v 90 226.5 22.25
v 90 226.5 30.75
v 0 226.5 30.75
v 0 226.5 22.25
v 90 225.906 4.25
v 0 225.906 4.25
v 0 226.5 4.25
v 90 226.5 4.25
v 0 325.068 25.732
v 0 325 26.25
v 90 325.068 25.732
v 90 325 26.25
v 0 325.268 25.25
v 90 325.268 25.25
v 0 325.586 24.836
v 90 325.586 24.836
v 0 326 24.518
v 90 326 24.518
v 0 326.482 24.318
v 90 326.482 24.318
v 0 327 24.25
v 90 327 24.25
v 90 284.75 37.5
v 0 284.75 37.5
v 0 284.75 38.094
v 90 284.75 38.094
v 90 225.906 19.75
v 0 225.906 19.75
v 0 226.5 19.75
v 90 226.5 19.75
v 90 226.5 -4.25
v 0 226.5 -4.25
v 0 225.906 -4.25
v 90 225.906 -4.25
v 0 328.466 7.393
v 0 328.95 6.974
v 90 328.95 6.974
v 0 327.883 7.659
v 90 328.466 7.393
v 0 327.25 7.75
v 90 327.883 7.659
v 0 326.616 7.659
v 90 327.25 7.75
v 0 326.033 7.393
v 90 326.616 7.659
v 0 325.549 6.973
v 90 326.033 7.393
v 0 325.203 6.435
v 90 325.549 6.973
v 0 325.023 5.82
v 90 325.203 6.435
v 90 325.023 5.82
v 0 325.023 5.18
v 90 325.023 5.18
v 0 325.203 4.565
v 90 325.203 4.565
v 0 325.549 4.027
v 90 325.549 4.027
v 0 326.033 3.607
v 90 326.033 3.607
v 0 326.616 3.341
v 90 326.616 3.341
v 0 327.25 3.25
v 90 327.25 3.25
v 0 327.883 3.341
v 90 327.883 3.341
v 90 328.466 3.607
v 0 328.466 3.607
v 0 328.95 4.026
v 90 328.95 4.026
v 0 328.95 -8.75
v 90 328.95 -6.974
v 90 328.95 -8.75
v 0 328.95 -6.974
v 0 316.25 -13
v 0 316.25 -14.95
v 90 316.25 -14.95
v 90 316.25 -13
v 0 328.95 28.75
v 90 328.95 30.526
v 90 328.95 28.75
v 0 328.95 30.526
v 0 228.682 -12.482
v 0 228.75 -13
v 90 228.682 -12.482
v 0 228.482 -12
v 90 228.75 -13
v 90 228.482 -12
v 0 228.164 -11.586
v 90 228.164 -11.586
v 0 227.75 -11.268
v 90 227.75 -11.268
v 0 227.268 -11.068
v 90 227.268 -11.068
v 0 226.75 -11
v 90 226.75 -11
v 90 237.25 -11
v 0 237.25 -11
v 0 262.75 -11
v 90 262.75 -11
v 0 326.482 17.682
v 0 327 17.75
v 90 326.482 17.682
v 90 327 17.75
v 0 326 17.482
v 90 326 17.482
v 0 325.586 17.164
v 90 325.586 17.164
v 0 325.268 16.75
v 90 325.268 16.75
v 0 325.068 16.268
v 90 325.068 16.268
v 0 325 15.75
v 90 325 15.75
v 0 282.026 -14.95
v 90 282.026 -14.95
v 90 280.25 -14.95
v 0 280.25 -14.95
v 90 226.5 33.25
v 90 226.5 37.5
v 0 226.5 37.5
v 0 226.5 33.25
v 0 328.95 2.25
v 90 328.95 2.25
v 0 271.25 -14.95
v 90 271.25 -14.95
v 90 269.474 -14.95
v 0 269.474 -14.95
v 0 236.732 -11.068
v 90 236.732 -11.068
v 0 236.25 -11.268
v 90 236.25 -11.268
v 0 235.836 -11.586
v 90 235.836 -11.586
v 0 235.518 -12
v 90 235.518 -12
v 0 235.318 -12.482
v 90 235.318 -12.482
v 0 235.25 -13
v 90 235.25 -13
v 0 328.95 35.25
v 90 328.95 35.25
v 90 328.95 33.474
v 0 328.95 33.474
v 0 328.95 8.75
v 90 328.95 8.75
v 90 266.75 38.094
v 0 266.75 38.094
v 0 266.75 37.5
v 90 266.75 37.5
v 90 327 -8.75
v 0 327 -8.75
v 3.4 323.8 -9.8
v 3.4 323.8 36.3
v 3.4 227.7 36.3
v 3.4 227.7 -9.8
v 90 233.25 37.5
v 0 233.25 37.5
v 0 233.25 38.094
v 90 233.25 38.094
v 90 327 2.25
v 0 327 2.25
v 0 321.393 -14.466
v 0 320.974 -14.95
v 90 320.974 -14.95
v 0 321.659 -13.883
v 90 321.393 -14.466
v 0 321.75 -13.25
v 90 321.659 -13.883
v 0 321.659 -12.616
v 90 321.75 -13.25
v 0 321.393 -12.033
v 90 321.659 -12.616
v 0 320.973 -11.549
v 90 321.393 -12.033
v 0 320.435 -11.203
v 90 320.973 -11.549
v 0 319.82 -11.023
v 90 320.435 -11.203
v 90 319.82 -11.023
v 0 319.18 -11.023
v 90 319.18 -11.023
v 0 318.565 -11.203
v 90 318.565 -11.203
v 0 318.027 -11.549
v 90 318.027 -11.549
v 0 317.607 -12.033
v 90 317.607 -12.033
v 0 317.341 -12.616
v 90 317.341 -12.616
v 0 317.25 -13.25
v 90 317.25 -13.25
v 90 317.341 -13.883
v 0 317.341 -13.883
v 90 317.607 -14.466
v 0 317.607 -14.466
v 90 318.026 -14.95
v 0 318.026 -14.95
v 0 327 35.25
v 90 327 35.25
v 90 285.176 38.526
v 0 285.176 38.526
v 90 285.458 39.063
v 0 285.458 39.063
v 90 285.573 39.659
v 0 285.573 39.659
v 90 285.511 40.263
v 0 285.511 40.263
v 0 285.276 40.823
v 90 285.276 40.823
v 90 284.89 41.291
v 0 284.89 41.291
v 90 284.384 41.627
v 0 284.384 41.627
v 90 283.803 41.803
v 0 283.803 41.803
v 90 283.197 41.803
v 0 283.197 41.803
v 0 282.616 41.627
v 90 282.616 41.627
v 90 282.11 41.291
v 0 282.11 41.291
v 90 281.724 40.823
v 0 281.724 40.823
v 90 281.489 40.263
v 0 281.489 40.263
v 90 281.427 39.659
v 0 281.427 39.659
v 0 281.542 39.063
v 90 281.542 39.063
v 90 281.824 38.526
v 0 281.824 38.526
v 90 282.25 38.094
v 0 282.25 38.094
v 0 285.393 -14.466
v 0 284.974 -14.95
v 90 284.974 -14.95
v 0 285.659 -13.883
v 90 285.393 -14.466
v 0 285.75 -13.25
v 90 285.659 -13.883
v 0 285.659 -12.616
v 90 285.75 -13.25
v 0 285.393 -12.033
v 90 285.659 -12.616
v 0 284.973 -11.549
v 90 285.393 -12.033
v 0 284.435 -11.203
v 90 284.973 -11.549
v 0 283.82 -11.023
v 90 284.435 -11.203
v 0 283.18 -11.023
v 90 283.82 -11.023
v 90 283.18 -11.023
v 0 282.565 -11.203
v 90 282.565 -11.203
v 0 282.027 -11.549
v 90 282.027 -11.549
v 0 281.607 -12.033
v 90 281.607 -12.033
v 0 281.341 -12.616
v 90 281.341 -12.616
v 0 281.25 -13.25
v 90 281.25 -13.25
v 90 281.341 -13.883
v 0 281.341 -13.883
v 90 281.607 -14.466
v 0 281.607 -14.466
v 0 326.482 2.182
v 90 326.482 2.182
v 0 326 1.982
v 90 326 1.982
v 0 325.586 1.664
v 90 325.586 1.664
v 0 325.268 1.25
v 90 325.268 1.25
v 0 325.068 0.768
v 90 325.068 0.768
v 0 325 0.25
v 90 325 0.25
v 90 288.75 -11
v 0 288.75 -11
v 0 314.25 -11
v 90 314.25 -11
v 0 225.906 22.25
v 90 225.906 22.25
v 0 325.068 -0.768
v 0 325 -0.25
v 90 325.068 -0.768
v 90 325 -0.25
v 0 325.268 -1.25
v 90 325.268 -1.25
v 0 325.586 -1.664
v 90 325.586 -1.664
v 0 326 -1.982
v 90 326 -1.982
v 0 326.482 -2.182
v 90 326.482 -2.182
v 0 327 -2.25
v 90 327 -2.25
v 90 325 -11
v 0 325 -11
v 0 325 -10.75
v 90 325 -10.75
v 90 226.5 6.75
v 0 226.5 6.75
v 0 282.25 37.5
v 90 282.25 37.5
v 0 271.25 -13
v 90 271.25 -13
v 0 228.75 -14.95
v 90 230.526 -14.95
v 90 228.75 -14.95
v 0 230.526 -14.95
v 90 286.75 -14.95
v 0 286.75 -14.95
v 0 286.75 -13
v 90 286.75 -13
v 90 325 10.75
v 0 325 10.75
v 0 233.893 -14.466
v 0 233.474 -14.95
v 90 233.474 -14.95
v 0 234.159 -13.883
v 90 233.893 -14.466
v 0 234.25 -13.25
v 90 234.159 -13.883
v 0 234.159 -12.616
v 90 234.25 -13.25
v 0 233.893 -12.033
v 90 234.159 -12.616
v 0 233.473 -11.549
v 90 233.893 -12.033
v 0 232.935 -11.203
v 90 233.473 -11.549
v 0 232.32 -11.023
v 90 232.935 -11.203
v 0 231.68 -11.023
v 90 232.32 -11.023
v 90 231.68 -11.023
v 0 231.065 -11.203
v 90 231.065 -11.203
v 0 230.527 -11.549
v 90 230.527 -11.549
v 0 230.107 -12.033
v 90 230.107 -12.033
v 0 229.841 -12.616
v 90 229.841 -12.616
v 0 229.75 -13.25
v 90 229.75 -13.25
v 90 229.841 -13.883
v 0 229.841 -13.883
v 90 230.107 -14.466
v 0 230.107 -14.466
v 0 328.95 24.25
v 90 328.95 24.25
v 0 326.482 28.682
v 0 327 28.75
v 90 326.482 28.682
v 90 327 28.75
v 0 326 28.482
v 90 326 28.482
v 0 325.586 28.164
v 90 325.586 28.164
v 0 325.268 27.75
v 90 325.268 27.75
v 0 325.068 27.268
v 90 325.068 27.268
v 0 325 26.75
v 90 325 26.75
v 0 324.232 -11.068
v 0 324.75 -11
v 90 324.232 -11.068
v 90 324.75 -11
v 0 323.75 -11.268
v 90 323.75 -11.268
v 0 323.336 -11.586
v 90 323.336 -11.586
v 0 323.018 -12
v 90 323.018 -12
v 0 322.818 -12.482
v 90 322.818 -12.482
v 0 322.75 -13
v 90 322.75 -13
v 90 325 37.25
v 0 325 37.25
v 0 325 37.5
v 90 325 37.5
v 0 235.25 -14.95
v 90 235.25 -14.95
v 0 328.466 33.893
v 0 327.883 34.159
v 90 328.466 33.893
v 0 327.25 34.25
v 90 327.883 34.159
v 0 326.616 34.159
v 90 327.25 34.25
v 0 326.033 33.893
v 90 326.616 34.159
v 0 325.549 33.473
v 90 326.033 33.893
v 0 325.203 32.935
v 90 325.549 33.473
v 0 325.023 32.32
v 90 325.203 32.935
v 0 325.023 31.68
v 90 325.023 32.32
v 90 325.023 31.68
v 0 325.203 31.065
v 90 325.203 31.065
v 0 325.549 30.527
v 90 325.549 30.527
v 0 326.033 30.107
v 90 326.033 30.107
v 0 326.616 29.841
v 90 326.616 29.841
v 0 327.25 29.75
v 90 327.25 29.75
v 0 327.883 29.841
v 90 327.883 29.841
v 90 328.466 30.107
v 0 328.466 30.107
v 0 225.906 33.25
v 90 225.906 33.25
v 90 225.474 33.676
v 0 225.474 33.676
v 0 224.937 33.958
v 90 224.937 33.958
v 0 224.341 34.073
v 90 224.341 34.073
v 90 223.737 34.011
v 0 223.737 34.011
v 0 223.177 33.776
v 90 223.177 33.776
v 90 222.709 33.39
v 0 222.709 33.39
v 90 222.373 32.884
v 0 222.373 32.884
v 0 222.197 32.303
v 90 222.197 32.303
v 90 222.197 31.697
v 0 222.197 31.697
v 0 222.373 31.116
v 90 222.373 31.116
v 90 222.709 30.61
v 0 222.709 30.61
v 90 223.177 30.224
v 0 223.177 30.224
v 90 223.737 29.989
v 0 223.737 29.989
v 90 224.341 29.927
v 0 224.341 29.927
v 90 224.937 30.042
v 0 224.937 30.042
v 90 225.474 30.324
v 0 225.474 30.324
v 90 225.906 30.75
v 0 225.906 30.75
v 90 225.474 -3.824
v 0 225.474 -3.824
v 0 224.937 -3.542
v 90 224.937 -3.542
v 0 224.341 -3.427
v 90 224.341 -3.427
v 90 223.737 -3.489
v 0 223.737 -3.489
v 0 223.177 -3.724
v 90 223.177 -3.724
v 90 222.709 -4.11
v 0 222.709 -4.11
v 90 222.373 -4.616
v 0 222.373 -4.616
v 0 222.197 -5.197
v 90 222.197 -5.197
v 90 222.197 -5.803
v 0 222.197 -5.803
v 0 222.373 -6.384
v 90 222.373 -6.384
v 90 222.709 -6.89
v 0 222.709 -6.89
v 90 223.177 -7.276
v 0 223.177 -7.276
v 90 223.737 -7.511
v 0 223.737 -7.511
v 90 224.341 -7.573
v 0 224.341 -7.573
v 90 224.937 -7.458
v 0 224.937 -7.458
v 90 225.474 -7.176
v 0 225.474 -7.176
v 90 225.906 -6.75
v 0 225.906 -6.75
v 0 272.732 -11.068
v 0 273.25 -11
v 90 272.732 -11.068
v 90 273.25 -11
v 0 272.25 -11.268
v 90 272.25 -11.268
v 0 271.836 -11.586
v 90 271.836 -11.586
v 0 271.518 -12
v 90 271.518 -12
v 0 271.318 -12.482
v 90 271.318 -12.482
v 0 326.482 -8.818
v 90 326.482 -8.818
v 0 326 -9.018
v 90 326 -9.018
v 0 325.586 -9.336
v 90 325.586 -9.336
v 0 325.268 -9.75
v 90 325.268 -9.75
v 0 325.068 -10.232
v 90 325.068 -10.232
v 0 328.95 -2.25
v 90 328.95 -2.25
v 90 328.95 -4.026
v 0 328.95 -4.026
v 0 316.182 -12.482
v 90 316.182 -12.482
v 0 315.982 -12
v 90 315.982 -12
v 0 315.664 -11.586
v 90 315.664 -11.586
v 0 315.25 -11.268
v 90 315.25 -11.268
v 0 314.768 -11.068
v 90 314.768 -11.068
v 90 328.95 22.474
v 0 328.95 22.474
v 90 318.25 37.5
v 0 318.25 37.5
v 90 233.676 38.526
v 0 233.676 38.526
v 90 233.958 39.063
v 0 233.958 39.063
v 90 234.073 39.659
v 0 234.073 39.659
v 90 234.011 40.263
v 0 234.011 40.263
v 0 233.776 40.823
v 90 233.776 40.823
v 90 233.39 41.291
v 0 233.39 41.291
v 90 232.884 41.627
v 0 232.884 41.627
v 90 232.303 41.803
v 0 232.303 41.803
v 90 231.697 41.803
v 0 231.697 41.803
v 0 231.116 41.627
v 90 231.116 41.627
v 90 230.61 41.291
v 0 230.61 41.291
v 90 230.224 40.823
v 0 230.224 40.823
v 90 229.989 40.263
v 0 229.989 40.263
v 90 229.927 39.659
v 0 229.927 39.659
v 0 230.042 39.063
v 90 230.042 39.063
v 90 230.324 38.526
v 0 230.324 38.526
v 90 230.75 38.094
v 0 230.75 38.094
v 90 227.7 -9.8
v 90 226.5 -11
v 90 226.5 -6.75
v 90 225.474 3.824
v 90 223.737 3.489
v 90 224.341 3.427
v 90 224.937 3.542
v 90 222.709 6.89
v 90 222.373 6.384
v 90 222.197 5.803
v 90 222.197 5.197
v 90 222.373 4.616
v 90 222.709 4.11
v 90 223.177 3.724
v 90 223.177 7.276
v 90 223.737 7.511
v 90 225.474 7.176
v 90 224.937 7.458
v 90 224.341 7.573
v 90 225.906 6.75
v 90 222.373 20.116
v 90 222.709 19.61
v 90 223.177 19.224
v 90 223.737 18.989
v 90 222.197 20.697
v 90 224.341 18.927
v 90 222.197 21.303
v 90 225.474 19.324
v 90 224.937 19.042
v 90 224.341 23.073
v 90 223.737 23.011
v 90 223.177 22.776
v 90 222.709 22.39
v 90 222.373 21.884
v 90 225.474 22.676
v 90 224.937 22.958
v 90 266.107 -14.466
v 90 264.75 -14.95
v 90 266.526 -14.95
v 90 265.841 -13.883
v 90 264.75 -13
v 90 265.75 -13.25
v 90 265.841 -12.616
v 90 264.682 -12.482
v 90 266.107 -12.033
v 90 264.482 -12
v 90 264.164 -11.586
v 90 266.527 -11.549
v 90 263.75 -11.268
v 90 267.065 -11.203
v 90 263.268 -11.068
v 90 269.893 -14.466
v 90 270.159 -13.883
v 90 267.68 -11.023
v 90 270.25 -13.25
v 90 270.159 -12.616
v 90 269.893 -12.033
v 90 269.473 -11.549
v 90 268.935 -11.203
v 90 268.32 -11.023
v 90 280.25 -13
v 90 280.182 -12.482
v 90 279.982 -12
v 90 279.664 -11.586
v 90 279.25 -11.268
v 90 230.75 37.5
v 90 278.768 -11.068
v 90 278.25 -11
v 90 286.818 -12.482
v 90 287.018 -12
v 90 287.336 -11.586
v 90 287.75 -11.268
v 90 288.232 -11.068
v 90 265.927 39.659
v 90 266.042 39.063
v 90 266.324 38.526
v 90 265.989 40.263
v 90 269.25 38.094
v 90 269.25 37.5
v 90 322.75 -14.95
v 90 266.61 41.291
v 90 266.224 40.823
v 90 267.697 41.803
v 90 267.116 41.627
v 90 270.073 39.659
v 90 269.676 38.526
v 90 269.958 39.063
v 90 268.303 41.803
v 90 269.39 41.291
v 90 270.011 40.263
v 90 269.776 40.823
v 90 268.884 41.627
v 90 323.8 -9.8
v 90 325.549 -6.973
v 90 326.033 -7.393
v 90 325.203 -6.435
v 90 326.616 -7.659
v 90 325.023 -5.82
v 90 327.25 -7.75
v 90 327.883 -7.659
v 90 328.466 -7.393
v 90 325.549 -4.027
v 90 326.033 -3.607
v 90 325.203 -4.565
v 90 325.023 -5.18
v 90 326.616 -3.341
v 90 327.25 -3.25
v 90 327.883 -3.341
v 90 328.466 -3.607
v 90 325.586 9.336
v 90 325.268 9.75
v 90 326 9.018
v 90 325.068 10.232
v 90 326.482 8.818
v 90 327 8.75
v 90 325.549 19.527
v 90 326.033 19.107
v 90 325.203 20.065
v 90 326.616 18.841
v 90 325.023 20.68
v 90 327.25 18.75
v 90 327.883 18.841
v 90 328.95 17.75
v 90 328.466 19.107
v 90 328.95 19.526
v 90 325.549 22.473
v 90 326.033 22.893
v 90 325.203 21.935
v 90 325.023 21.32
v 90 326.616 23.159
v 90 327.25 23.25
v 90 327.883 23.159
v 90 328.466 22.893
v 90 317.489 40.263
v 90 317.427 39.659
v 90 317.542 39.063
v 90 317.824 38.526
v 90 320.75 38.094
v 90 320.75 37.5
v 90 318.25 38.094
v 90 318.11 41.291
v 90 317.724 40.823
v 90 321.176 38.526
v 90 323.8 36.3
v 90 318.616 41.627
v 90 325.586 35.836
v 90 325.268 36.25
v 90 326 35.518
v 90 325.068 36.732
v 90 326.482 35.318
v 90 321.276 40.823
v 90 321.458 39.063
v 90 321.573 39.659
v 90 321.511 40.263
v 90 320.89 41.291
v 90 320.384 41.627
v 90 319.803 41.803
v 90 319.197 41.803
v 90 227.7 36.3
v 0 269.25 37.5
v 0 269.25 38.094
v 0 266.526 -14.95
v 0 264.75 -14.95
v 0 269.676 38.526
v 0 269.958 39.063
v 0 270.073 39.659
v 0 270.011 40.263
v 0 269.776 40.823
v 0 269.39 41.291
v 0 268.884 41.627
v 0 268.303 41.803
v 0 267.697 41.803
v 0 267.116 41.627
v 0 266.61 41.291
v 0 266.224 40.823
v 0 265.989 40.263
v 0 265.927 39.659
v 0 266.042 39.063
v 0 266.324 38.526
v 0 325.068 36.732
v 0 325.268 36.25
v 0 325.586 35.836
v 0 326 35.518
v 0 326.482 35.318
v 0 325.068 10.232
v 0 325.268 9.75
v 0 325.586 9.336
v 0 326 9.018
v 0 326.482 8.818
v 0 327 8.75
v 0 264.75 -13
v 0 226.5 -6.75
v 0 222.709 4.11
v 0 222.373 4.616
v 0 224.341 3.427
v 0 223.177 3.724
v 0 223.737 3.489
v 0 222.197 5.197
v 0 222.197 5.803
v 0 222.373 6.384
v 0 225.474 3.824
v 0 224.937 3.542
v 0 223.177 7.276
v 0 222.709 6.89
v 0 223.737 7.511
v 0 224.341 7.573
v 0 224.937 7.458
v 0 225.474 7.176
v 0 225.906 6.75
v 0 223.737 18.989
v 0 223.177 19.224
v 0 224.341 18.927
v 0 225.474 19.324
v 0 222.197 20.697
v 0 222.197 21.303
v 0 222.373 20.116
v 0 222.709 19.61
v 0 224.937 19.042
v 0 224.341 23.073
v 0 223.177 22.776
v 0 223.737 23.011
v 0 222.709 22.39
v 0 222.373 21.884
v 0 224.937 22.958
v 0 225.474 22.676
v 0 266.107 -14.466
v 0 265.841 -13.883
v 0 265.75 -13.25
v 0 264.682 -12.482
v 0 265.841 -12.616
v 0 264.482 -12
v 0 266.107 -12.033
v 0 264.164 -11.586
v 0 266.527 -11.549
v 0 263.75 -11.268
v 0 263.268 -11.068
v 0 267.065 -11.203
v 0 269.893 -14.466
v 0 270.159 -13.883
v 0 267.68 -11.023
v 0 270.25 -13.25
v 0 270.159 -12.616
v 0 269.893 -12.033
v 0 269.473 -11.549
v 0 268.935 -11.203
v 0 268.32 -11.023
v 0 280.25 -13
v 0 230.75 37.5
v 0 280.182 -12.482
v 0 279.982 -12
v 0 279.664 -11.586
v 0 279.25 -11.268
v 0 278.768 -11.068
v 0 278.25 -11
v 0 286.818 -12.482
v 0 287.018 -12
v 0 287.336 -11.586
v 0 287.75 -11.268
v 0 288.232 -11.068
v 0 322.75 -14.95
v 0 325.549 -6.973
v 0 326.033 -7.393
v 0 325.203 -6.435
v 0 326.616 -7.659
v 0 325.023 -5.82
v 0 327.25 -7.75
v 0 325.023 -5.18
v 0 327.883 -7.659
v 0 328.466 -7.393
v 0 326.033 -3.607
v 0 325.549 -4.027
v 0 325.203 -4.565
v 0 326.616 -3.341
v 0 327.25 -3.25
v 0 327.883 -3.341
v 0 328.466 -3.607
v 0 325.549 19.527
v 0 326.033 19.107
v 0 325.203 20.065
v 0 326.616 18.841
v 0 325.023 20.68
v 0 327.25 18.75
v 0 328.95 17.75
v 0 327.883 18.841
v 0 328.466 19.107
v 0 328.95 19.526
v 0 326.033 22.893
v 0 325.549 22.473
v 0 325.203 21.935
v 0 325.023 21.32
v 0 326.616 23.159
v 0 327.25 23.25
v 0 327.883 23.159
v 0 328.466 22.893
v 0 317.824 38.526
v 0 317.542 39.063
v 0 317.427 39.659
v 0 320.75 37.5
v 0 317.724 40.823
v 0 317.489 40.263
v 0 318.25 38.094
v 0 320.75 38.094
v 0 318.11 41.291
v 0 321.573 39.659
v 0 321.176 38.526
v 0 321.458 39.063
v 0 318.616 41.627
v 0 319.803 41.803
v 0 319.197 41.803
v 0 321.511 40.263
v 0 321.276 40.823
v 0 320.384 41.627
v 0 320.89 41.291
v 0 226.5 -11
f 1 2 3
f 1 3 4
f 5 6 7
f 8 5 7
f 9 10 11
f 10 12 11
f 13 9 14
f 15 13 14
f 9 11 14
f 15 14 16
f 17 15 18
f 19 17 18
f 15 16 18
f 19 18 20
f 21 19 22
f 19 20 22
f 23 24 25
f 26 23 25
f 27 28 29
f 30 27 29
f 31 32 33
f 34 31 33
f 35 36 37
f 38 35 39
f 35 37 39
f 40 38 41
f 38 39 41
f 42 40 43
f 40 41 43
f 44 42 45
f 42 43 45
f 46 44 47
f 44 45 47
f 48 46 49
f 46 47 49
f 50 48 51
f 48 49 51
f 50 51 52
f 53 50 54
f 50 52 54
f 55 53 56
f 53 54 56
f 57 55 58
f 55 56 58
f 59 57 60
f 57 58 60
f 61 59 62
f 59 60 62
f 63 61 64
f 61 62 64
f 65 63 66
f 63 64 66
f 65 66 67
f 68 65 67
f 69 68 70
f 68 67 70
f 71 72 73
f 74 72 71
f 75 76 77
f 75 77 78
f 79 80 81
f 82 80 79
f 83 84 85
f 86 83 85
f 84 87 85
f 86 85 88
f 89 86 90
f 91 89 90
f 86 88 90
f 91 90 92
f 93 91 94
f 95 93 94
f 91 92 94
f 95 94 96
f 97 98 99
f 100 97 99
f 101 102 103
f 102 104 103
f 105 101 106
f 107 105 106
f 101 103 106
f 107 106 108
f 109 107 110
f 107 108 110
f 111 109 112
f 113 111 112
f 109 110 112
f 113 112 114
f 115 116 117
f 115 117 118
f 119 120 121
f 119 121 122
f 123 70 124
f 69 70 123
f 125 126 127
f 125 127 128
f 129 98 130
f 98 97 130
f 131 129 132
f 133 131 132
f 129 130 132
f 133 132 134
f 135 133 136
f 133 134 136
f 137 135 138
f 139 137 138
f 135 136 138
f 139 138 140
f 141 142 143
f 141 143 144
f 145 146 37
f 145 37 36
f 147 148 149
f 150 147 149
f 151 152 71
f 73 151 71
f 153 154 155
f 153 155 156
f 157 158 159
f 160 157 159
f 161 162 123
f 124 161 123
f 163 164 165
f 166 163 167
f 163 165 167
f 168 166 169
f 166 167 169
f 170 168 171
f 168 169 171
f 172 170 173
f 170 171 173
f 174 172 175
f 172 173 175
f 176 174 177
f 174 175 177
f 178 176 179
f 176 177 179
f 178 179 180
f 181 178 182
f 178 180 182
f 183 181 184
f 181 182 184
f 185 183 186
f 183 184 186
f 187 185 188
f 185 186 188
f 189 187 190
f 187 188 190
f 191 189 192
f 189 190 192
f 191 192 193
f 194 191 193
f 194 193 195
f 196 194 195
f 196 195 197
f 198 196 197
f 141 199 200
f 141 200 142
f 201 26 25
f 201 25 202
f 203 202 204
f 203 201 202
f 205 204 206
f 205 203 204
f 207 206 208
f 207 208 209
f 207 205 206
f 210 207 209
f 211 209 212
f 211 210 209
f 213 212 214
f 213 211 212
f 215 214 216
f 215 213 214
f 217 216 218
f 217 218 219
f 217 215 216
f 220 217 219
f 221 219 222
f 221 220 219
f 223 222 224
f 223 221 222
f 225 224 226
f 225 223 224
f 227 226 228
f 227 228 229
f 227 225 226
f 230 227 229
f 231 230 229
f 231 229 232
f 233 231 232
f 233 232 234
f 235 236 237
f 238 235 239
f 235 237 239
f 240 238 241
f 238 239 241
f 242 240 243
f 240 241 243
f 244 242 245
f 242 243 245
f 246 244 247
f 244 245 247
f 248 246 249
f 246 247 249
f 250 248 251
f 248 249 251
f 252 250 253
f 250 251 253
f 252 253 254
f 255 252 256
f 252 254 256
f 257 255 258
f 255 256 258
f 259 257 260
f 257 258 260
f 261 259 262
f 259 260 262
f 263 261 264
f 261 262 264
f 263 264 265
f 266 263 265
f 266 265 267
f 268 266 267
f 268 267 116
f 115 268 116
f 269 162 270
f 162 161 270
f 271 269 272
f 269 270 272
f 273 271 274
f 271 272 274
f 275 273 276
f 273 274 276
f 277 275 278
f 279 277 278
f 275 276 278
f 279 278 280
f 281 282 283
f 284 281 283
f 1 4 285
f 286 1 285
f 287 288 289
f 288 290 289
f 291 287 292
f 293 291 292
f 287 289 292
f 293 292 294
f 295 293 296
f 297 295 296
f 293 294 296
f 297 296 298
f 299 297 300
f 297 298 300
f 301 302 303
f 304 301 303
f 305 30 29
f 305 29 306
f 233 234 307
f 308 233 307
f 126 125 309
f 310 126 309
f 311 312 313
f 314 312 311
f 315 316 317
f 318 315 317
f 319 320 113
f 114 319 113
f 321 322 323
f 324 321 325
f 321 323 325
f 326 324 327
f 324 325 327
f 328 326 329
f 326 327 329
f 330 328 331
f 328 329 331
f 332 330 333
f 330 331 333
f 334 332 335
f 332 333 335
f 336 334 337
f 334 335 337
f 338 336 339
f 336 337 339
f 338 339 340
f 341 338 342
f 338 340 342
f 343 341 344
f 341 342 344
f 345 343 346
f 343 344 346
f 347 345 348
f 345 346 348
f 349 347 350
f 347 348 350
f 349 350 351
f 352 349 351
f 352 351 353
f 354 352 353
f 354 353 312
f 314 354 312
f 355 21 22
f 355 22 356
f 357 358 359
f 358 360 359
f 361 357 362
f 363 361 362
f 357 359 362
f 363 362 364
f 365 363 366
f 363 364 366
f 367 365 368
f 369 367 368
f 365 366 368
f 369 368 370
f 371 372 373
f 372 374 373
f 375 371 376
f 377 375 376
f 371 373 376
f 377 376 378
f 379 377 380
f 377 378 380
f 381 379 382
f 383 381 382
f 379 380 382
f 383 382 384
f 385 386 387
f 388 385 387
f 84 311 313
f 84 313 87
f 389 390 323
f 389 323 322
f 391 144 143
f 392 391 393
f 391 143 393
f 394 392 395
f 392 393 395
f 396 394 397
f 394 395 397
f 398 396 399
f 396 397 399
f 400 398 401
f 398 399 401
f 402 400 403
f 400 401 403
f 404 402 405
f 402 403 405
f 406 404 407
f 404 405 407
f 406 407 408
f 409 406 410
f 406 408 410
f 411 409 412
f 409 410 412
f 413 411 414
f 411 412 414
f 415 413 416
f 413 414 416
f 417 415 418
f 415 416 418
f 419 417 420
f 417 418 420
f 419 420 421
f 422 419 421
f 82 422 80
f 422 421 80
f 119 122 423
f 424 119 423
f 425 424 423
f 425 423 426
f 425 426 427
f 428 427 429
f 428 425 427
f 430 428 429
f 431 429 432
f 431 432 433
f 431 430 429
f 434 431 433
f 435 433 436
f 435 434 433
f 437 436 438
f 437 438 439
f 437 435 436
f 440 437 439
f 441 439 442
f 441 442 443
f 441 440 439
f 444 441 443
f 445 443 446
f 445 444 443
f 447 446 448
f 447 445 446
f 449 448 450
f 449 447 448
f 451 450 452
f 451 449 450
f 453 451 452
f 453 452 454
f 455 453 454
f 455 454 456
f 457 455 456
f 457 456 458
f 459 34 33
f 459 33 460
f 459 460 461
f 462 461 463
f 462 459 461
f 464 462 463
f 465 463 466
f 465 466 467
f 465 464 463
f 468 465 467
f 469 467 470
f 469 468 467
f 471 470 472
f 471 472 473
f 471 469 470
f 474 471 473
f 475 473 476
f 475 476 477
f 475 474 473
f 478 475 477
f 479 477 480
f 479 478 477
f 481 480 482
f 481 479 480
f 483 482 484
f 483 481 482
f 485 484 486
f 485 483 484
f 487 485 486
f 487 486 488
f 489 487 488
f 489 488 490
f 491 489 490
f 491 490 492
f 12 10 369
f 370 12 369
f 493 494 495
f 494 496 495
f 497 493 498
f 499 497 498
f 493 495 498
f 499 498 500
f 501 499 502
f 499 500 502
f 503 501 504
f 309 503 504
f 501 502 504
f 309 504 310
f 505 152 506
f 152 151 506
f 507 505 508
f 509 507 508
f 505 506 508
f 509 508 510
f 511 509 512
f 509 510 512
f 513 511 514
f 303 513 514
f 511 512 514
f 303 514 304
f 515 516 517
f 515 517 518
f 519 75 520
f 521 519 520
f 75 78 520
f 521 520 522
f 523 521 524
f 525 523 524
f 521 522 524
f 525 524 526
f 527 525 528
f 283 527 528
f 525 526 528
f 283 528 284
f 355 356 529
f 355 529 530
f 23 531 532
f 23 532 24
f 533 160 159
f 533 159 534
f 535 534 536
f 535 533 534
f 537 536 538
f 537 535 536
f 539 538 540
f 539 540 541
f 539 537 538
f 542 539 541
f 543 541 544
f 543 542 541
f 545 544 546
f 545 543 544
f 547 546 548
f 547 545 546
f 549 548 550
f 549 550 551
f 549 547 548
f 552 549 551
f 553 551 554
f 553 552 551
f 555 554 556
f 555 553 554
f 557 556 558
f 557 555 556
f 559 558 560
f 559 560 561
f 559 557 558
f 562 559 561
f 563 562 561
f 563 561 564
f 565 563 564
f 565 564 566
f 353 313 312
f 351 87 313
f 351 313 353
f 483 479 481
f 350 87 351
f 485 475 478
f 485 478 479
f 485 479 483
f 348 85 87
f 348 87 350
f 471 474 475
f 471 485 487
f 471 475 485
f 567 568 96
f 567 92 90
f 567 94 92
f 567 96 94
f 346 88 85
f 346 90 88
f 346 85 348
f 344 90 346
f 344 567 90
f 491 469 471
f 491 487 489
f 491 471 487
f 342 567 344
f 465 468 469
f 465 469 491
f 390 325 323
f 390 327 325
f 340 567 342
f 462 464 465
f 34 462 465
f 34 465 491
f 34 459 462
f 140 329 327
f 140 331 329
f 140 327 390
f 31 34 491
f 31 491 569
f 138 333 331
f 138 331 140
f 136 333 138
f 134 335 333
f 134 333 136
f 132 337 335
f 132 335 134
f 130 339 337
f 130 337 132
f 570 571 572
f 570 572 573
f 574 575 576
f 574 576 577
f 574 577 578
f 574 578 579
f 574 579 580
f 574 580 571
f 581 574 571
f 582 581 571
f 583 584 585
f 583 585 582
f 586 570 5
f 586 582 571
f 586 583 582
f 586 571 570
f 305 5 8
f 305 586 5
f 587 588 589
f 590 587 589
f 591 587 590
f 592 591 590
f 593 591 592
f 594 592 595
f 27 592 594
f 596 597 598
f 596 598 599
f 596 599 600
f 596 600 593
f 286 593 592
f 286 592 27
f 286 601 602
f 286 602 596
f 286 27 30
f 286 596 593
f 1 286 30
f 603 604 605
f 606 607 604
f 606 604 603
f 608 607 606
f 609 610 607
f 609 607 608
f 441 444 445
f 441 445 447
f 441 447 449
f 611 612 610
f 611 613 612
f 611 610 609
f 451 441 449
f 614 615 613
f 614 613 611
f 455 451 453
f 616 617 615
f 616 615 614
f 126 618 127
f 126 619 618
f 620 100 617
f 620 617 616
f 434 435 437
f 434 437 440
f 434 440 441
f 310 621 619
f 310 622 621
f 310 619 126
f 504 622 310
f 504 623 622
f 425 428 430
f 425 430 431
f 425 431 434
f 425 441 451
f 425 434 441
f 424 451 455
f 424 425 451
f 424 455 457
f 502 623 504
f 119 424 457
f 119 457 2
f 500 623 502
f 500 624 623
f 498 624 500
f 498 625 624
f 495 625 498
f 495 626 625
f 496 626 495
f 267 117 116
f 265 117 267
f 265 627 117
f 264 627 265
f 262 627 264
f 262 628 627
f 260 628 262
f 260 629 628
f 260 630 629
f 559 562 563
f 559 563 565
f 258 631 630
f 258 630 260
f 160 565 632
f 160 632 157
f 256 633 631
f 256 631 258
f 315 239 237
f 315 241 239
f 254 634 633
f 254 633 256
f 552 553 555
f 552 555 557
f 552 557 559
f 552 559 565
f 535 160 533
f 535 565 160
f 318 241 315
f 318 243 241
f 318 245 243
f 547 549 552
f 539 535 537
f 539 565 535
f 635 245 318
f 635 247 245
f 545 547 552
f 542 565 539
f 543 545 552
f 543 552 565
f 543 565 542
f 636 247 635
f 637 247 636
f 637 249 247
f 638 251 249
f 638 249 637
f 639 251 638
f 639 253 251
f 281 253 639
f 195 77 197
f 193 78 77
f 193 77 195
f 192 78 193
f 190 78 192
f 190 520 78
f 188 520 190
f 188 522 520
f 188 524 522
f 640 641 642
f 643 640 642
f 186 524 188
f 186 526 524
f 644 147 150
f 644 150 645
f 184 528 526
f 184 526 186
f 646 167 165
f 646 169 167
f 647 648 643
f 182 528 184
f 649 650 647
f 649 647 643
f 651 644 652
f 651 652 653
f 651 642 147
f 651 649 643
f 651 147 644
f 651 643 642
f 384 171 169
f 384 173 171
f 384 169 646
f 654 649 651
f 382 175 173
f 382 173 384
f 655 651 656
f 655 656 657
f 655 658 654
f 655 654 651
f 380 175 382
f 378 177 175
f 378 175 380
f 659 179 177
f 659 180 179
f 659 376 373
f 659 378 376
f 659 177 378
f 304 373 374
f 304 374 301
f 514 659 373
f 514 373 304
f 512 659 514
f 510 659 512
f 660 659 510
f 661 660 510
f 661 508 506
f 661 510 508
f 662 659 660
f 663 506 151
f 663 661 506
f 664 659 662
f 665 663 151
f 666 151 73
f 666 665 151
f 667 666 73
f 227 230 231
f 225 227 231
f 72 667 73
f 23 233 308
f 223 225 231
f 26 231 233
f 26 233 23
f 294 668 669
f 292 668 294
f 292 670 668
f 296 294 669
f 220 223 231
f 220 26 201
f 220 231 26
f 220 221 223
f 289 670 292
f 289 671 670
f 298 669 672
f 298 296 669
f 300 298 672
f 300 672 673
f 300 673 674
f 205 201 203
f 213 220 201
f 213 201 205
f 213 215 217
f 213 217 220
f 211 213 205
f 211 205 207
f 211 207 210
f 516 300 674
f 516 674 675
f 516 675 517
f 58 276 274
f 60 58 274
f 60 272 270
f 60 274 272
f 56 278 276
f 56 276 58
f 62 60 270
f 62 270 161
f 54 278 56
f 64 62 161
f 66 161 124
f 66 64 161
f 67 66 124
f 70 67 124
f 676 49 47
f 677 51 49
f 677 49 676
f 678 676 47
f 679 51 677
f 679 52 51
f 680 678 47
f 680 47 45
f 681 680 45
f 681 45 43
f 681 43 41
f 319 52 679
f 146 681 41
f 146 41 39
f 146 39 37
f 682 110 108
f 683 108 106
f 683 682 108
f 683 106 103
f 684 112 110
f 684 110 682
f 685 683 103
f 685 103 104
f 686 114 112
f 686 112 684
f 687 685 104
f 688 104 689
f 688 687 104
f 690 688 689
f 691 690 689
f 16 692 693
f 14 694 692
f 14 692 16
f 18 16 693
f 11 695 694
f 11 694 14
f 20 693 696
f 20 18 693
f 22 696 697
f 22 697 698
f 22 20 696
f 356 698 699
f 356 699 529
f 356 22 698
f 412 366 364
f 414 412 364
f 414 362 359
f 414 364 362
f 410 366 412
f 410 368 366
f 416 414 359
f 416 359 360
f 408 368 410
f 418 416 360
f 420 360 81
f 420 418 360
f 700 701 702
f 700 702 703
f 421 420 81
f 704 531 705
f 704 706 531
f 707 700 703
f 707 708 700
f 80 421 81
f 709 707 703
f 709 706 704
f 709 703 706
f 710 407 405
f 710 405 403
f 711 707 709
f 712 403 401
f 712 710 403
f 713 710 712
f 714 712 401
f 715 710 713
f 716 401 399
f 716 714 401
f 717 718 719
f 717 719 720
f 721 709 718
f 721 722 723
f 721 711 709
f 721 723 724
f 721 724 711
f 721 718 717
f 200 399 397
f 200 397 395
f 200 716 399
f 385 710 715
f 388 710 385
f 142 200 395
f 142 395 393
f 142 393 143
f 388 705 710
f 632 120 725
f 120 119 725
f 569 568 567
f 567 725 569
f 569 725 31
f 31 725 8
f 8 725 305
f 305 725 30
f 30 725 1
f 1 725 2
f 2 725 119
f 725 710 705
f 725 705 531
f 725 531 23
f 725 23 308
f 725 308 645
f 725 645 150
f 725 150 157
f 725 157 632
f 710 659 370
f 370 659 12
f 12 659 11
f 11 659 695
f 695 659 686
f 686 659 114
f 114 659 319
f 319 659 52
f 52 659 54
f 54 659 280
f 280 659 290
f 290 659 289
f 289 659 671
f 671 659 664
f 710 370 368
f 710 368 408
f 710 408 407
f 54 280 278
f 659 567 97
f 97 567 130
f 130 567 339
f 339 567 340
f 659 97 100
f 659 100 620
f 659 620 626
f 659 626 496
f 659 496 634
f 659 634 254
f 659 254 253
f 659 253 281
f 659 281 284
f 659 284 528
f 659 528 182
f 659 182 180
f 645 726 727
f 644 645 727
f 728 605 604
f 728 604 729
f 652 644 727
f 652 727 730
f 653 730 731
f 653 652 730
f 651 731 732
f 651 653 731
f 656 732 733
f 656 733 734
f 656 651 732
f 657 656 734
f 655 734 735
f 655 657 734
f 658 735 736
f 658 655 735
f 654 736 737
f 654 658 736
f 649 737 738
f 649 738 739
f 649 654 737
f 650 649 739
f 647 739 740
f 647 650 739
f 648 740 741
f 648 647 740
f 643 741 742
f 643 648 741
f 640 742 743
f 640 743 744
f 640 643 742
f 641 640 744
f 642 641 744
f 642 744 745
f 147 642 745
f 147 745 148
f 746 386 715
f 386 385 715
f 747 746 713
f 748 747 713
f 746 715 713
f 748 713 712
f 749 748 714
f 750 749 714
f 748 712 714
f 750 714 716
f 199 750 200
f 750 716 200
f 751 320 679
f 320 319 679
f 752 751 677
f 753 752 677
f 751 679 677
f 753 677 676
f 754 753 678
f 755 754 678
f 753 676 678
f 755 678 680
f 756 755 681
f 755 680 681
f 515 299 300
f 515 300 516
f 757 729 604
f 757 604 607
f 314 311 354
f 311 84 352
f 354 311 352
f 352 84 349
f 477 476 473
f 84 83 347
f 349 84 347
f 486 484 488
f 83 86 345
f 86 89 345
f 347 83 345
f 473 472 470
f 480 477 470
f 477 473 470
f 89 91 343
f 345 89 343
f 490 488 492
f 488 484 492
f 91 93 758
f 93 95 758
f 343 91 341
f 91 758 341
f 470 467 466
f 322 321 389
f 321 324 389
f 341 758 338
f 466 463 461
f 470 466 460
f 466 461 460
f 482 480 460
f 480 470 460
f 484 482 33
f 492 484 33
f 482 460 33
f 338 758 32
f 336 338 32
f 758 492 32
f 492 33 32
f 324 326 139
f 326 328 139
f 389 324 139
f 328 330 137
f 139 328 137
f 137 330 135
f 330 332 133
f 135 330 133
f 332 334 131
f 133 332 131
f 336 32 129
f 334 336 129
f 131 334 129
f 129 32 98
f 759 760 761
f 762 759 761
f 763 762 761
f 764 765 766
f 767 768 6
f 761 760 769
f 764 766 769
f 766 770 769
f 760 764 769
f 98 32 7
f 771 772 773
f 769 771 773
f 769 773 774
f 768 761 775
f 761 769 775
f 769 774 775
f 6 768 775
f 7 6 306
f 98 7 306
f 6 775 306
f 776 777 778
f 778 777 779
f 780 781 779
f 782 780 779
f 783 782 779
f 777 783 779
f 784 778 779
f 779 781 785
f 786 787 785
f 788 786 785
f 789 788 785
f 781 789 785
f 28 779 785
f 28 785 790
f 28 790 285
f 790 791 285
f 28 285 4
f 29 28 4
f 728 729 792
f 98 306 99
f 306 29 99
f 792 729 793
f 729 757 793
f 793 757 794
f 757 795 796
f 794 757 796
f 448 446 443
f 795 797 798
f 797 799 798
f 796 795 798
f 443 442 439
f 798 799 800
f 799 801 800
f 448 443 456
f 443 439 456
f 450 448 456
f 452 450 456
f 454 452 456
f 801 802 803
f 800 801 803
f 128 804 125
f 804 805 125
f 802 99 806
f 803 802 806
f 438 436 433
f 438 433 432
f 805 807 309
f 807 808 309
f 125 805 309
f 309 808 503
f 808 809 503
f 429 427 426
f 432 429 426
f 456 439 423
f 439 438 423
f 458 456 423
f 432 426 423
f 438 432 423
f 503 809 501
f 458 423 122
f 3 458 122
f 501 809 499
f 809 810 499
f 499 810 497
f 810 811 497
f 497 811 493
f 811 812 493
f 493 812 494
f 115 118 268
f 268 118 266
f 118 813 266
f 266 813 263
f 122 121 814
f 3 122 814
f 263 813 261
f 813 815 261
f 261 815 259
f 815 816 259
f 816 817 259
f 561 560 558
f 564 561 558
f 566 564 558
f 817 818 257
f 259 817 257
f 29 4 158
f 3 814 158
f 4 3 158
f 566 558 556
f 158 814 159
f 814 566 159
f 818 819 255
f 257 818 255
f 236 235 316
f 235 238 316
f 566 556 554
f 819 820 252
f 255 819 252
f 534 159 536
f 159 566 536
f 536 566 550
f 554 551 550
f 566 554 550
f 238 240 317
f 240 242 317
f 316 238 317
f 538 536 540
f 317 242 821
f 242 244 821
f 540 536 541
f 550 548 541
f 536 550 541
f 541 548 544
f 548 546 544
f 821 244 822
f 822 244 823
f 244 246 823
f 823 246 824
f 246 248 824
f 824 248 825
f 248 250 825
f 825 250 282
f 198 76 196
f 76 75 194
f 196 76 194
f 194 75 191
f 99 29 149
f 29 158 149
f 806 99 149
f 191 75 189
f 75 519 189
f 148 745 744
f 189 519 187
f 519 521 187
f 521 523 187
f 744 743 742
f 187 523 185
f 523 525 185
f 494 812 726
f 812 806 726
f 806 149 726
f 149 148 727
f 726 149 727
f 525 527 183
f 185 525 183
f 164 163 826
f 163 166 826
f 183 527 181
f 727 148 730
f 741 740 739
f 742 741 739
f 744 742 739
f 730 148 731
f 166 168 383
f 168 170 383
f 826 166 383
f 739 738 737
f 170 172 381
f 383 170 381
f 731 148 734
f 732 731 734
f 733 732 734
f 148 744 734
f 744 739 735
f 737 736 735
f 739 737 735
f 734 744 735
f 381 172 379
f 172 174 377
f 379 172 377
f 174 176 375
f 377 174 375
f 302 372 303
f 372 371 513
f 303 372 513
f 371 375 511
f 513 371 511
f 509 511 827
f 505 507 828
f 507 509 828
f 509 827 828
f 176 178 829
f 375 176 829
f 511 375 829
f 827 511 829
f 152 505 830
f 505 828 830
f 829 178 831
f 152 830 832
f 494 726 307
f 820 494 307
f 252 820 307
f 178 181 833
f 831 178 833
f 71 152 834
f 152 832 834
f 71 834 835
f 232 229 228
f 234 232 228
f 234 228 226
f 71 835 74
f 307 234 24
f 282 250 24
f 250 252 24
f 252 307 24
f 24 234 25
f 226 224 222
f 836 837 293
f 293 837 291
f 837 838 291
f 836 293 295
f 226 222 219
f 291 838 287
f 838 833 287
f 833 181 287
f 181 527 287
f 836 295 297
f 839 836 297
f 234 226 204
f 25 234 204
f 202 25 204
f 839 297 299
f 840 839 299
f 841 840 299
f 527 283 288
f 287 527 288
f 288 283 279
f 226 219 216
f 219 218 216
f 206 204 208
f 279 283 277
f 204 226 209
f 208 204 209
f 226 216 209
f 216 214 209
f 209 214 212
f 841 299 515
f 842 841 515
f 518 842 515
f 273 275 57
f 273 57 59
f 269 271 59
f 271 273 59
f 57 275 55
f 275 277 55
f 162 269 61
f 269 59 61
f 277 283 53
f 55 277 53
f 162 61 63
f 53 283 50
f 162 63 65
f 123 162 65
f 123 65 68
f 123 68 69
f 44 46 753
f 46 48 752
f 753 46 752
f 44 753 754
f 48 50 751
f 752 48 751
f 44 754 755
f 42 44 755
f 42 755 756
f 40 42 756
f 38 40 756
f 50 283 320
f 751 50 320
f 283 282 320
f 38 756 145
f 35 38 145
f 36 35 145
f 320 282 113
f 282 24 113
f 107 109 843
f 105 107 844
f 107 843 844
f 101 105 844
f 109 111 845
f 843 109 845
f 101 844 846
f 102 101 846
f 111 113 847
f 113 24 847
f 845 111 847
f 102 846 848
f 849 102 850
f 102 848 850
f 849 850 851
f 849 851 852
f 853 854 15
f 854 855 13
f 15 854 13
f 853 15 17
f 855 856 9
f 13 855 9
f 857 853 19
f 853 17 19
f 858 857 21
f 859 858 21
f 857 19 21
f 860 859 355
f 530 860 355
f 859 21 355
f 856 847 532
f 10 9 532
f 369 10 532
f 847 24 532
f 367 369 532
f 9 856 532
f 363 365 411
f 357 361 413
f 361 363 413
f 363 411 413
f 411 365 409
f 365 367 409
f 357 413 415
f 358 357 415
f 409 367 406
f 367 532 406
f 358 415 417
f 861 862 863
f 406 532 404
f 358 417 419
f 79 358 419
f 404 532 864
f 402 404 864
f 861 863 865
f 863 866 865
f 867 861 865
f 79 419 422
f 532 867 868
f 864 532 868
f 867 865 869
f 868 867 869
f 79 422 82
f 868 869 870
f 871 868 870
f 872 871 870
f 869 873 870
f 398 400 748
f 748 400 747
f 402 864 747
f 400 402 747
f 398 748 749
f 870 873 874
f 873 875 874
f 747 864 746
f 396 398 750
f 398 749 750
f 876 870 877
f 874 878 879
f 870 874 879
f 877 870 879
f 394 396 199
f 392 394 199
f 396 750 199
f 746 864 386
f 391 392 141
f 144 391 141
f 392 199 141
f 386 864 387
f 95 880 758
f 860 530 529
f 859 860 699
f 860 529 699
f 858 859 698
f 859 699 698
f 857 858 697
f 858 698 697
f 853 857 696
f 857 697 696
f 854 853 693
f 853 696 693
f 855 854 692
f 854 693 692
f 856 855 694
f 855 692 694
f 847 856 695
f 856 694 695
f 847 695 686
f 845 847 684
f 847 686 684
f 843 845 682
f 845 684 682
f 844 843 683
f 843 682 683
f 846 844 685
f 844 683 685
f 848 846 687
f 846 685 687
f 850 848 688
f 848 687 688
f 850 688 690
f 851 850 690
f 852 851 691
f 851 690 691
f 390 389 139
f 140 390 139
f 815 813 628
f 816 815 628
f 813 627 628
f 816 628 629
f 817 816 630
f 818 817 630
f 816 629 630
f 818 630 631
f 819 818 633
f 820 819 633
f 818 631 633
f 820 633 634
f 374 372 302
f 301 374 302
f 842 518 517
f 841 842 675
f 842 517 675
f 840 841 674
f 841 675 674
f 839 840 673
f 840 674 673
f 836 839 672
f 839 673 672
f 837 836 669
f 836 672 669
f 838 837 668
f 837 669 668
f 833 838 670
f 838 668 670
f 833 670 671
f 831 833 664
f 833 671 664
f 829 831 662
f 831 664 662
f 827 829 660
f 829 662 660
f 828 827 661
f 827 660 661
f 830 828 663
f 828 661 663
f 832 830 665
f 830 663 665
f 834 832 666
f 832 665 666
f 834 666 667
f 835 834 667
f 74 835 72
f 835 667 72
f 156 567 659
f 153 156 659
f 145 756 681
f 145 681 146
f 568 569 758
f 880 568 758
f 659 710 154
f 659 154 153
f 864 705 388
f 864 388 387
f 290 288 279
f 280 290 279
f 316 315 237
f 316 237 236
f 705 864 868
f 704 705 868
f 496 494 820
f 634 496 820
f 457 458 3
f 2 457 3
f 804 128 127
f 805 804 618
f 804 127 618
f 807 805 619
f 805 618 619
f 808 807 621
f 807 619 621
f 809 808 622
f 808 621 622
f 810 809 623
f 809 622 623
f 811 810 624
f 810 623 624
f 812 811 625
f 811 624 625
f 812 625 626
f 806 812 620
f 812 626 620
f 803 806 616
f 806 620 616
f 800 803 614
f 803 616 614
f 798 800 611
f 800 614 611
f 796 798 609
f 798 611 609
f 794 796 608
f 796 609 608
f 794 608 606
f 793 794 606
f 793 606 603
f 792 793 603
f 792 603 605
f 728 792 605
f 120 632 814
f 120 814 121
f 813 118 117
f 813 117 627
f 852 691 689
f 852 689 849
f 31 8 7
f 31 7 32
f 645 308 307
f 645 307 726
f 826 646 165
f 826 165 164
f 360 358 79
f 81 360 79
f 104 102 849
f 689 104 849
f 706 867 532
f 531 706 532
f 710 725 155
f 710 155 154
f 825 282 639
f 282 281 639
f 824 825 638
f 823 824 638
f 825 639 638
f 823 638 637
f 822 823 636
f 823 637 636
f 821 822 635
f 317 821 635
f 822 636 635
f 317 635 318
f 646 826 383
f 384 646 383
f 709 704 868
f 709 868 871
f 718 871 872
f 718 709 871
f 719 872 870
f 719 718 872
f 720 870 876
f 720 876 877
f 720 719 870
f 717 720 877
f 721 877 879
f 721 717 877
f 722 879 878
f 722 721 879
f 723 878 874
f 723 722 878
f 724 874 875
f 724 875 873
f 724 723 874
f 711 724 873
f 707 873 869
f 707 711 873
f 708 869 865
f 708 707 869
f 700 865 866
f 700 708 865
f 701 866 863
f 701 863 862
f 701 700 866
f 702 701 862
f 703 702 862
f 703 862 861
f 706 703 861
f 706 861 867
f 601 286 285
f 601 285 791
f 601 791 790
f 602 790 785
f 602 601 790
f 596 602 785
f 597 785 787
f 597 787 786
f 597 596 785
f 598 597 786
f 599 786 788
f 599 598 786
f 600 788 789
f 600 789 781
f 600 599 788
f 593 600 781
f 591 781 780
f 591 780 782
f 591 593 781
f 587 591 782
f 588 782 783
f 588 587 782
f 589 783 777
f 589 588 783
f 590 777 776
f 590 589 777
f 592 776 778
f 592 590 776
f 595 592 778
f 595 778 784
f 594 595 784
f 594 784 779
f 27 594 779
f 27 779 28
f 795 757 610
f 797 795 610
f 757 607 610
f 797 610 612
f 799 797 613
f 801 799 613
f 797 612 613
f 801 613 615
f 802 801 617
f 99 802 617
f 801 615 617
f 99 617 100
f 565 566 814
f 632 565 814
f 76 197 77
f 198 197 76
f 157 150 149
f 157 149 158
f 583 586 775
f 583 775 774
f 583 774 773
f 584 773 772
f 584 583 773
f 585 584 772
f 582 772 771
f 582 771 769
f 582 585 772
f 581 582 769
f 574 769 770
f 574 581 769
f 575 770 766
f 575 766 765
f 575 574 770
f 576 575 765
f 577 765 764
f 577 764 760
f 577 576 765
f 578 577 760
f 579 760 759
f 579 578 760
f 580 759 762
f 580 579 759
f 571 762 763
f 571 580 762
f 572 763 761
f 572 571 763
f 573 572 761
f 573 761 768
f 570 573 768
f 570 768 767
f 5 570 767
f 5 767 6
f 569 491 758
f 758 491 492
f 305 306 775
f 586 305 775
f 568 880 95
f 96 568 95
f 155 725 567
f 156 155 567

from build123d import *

# Parameters (mm, degrees)
EXTRUDE_1_DEPTH             = 90
SKETCH_2_W                  = 90
SKETCH_2_H                  = 44.25
EXTRUDE_2_DEPTH             = 8.2
SKETCH_3_W                  = 90
SKETCH_3_H                  = 102.45
EXTRUDE_3_DEPTH             = 8.2
SKETCH_4_W                  = 4.5
SKETCH_4_H                  = 3.95
CUT_EXTRUDE_1_DEPTH         = 91
SKETCH_5_W                  = 2.25
SKETCH_5_H                  = 3.95
CUT_EXTRUDE_2_DEPTH         = 91
SKETCH_6_W                  = 3.95
SKETCH_6_H                  = 2.25
CUT_EXTRUDE_3_DEPTH         = 91
SKETCH_7_W                  = 3.95
SKETCH_7_H                  = 29.5
CUT_EXTRUDE_4_DEPTH         = 91
SKETCH_8_W                  = 3.95
SKETCH_8_H                  = 9
CUT_EXTRUDE_5_DEPTH         = 91
SKETCH_9_W                  = 3.95
SKETCH_9_H                  = 29.5
CUT_EXTRUDE_6_DEPTH         = 91
SKETCH_10_W                 = 3.95
SKETCH_10_H                 = 6.2
CUT_EXTRUDE_7_DEPTH         = 91
SKETCH_11_W                 = 2.25
SKETCH_11_H                 = 3.95
CUT_EXTRUDE_8_DEPTH         = 91
SKETCH_12_W                 = 4.5
SKETCH_12_H                 = 3.95
CUT_EXTRUDE_9_DEPTH         = 91
SKETCH_13_W                 = 9
SKETCH_13_H                 = 3.95
CUT_EXTRUDE_10_DEPTH        = 91
SKETCH_14_W                 = 46.1
SKETCH_14_H                 = 96.1
CUT_EXTRUDE_11_DEPTH        = 86.6
HOLE_WIZARD_2_5_2_5_1_D     = 2.5
HOLE_WIZARD_2_5_2_5_1_DEPTH = 90
HOLE_WIZARD_4_5_4_5_1_D     = 4.5
HOLE_WIZARD_4_5_4_5_1_DEPTH = 90
SKETCH_22_R                 = 1.631577579
SKETCH_22_R_2               = 1.519375383
SKETCH_22_R_3               = 1.487580747
SKETCH_22_R_4               = 1.581735942
SKETCH_22_R_5               = 1.487835557
SKETCH_22_R_6               = 1.42600834
SKETCH_22_R_7               = 1.628129915
SKETCH_22_R_8               = 1.52367125
EXTRUDE_4_DEPTH             = 90
FILLET_5_R                  = 2
FILLET_6_R                  = 2
FILLET_7_R                  = 2
FILLET_8_R                  = 2
FILLET_9_R                  = 2
FILLET_10_R                 = 2
FILLET_11_R                 = 2
FILLET_12_R                 = 2
FILLET_13_R                 = 2
FILLET_14_R                 = 2
FILLET_15_R                 = 2
FILLET_16_R                 = 2
FILLET_17_R                 = 2
FILLET_18_R                 = 2
FILLET_19_R                 = 2
FILLET_20_R                 = 2


with BuildPart() as part:
    # Эскиз1 → Бобышка-Вытянуть1 (new body)
    with BuildSketch(Plane(origin=(90, 0, 0), x_dir=(0, 0, -1), z_dir=(1, 0, 0))):
        with BuildLine():
            Line((6.75, 225.906238208), (6.75, 320.75))
            Line((6.75, 320.75), (-38.093761792, 320.75))
            ThreePointArc((-38.093761792, 320.75), (-41.825, 319.5), (-38.093761792, 318.25))
            Line((-38.093761792, 318.25), (-37.5, 318.25))
            Line((-37.5, 318.25), (-37.5, 284.75))
            Line((-37.5, 284.75), (-38.093761792, 284.75))
            ThreePointArc((-38.093761792, 284.75), (-41.825, 283.5), (-38.093761792, 282.25))
            Line((-38.093761792, 282.25), (-37.5, 282.25))
            Line((-37.5, 282.25), (-37.5, 269.25))
            Line((-37.5, 269.25), (-38.093761792, 269.25))
            ThreePointArc((-38.093761792, 269.25), (-41.825, 268), (-38.093761792, 266.75))
            Line((-38.093761792, 266.75), (-37.5, 266.75))
            Line((-37.5, 266.75), (-37.5, 233.25))
            Line((-37.5, 233.25), (-38.093761792, 233.25))
            ThreePointArc((-38.093761792, 233.25), (-41.825, 232), (-38.093761792, 230.75))
            Line((-38.093761792, 230.75), (-37.5, 230.75))
            Line((-37.5, 230.75), (-37.5, 226.5))
            Line((-37.5, 226.5), (-33.25, 226.5))
            Line((-33.25, 226.5), (-33.25, 225.906238208))
            ThreePointArc((-33.25, 225.906238208), (-32, 222.175), (-30.75, 225.906238208))
            Line((-30.75, 225.906238208), (-30.75, 226.5))
            Line((-30.75, 226.5), (-22.25, 226.5))
            Line((-22.25, 226.5), (-22.25, 225.906238208))
            ThreePointArc((-22.25, 225.906238208), (-21, 222.175), (-19.75, 225.906238208))
            Line((-19.75, 225.906238208), (-19.75, 226.5))
            Line((-19.75, 226.5), (-6.75, 226.5))
            Line((-6.75, 226.5), (-6.75, 225.906238208))
            ThreePointArc((-6.75, 225.906238208), (-5.5, 222.175), (-4.25, 225.906238208))
            Line((-4.25, 225.906238208), (-4.25, 226.5))
            Line((-4.25, 226.5), (4.25, 226.5))
            Line((4.25, 226.5), (4.25, 225.906238208))
            ThreePointArc((4.25, 225.906238208), (5.5, 222.175), (6.75, 225.906238208))
        make_face()
    extrude(amount=-EXTRUDE_1_DEPTH)

    # Эскиз2 → Бобышка-Вытянуть2 (add)
    with BuildSketch(Plane(origin=(0, 320.75, 0), x_dir=(-1, 0, 0), z_dir=(0, 1, 0))):
        with Locations((-45, 15.375)):
            Rectangle(SKETCH_2_W, SKETCH_2_H)
    extrude(amount=EXTRUDE_2_DEPTH)

    # Эскиз3 → Бобышка-Вытянуть3 (add)
    with BuildSketch(Plane(origin=(0, 0, -6.75), x_dir=(-1, 0, 0), z_dir=(0, 0, -1))):
        with Locations((-45, 277.725)):
            Rectangle(SKETCH_3_W, SKETCH_3_H)
    extrude(amount=EXTRUDE_3_DEPTH)

    # Эскиз4 → Вырез-Вытянуть1 (cut, through all)
    with BuildSketch(Plane.ZY):
        with Locations((26.5, 326.975)):
            Rectangle(SKETCH_4_W, SKETCH_4_H)
    extrude(amount=-CUT_EXTRUDE_1_DEPTH, mode=Mode.SUBTRACT)

    # Эскиз5 → Вырез-Вытянуть2 (cut, through all)
    with BuildSketch(Plane.ZY):
        with Locations((36.375, 326.975)):
            Rectangle(SKETCH_5_W, SKETCH_5_H)
    extrude(amount=-CUT_EXTRUDE_2_DEPTH, mode=Mode.SUBTRACT)

    # Эскиз6 → Вырез-Вытянуть3 (cut, through all)
    with BuildSketch(Plane.ZY):
        with Locations((-12.975, 227.625)):
            Rectangle(SKETCH_6_W, SKETCH_6_H)
    extrude(amount=-CUT_EXTRUDE_3_DEPTH, mode=Mode.SUBTRACT)

    # Эскиз7 → Вырез-Вытянуть4 (cut, through all)
    with BuildSketch(Plane.ZY):
        with Locations((-12.975, 250)):
            Rectangle(SKETCH_7_W, SKETCH_7_H)
    extrude(amount=-CUT_EXTRUDE_4_DEPTH, mode=Mode.SUBTRACT)

    # Эскиз8 → Вырез-Вытянуть5 (cut, through all)
    with BuildSketch(Plane.ZY):
        with Locations((-12.975, 275.75)):
            Rectangle(SKETCH_8_W, SKETCH_8_H)
    extrude(amount=-CUT_EXTRUDE_5_DEPTH, mode=Mode.SUBTRACT)

    # Эскиз9 → Вырез-Вытянуть6 (cut, through all)
    with BuildSketch(Plane.ZY):
        with Locations((-12.975, 301.5)):
            Rectangle(SKETCH_9_W, SKETCH_9_H)
    extrude(amount=-CUT_EXTRUDE_6_DEPTH, mode=Mode.SUBTRACT)

    # Эскиз10 → Вырез-Вытянуть7 (cut, through all)
    with BuildSketch(Plane.ZY):
        with Locations((-12.975, 325.85)):
            Rectangle(SKETCH_10_W, SKETCH_10_H)
    extrude(amount=-CUT_EXTRUDE_7_DEPTH, mode=Mode.SUBTRACT)

    # Эскиз11 → Вырез-Вытянуть8 (cut, through all)
    with BuildSketch(Plane.ZY):
        with Locations((-9.875, 326.975)):
            Rectangle(SKETCH_11_W, SKETCH_11_H)
    extrude(amount=-CUT_EXTRUDE_8_DEPTH, mode=Mode.SUBTRACT)

    # Эскиз12 → Вырез-Вытянуть9 (cut, through all)
    with BuildSketch(Plane.ZY):
        with Locations((0, 326.975)):
            Rectangle(SKETCH_12_W, SKETCH_12_H)
    extrude(amount=-CUT_EXTRUDE_9_DEPTH, mode=Mode.SUBTRACT)

    # Эскиз13 → Вырез-Вытянуть10 (cut, through all)
    with BuildSketch(Plane.ZY):
        with Locations((13.25, 326.975)):
            Rectangle(SKETCH_13_W, SKETCH_13_H)
    extrude(amount=-CUT_EXTRUDE_10_DEPTH, mode=Mode.SUBTRACT)

    # Эскиз14 → Вырез-Вытянуть11 (cut)
    with BuildSketch(Plane(origin=(90, 0, 0), x_dir=(0, 0, -1), z_dir=(1, 0, 0))):
        with Locations((-13.25, 275.75)):
            Rectangle(SKETCH_14_W, SKETCH_14_H)
    extrude(amount=-CUT_EXTRUDE_11_DEPTH, mode=Mode.SUBTRACT)

    # Диаметр отверстия Ø2.5 (2.5)1
    with Locations(Plane(origin=(90, 0, 0), x_dir=(0, 0, -1), z_dir=(1, 0, 0))):
        with Locations((-39.75, 232), (-21, 224.25), (-39.75, 283.5), (-5.5, 224.25), (5.5, 224.25), (-39.75, 319.5), (-39.75, 268), (-32, 224.25)):
            Hole(HOLE_WIZARD_2_5_2_5_1_D / 2, depth=HOLE_WIZARD_2_5_2_5_1_DEPTH)

    # Диаметр отверстия Ø4.5 (4.5)1
    with Locations(Plane.ZY):
        with Locations((21, 327.25), (32, 327.25), (-13.25, 232), (-13.25, 268), (-13.25, 283.5), (-13.25, 319.5), (-5.5, 327.25), (5.5, 327.25)):
            Hole(HOLE_WIZARD_4_5_4_5_1_D / 2, depth=HOLE_WIZARD_4_5_4_5_1_DEPTH)

    # Эскиз22 → Бобышка-Вытянуть4 (add)
    with BuildSketch(Plane(origin=(90, 0, 0), x_dir=(0, 0, -1), z_dir=(1, 0, 0))):
        with Locations((-39.75, 319.5)):
            Circle(SKETCH_22_R)
        with Locations((-39.75, 283.5)):
            Circle(SKETCH_22_R_2)
        with Locations((-39.75, 268)):
            Circle(SKETCH_22_R_3)
        with Locations((-39.75, 232)):
            Circle(SKETCH_22_R_4)
        with Locations((-32, 224.25)):
            Circle(SKETCH_22_R_5)
        with Locations((-21, 224.25)):
            Circle(SKETCH_22_R_6)
        with Locations((-5.5, 224.25)):
            Circle(SKETCH_22_R_7)
        with Locations((5.5, 224.25)):
            Circle(SKETCH_22_R_8)
    extrude(amount=-EXTRUDE_4_DEPTH)

    # Скругление5
    fillet_5_edges = [part.edges().sort_by_distance(p)[0] for p in [
        (45, 325, 35.25),
    ]]
    fillet(fillet_5_edges, radius=FILLET_5_R)

    # Скругление6
    fillet_6_edges = [part.edges().sort_by_distance(p)[0] for p in [
        (45, 325, 28.75),
    ]]
    fillet(fillet_6_edges, radius=FILLET_6_R)

    # Скругление7
    fillet_7_edges = [part.edges().sort_by_distance(p)[0] for p in [
        (45, 325, 24.25),
    ]]
    fillet(fillet_7_edges, radius=FILLET_7_R)

    # Скругление8
    fillet_8_edges = [part.edges().sort_by_distance(p)[0] for p in [
        (45, 325, 17.75),
    ]]
    fillet(fillet_8_edges, radius=FILLET_8_R)

    # Скругление9
    fillet_9_edges = [part.edges().sort_by_distance(p)[0] for p in [
        (45, 325, 8.75),
    ]]
    fillet(fillet_9_edges, radius=FILLET_9_R)

    # Скругление10
    fillet_10_edges = [part.edges().sort_by_distance(p)[0] for p in [
        (45, 325, 2.25),
    ]]
    fillet(fillet_10_edges, radius=FILLET_10_R)

    # Скругление11
    fillet_11_edges = [part.edges().sort_by_distance(p)[0] for p in [
        (45, 325, -2.25),
    ]]
    fillet(fillet_11_edges, radius=FILLET_11_R)

    # Скругление12
    fillet_12_edges = [part.edges().sort_by_distance(p)[0] for p in [
        (45, 325, -8.75),
    ]]
    fillet(fillet_12_edges, radius=FILLET_12_R)

    # Скругление13
    fillet_13_edges = [part.edges().sort_by_distance(p)[0] for p in [
        (45, 322.75, -11),
    ]]
    fillet(fillet_13_edges, radius=FILLET_13_R)

    # Скругление14
    fillet_14_edges = [part.edges().sort_by_distance(p)[0] for p in [
        (45, 316.25, -11),
    ]]
    fillet(fillet_14_edges, radius=FILLET_14_R)

    # Скругление15
    fillet_15_edges = [part.edges().sort_by_distance(p)[0] for p in [
        (45, 286.75, -11),
    ]]
    fillet(fillet_15_edges, radius=FILLET_15_R)

    # Скругление16
    fillet_16_edges = [part.edges().sort_by_distance(p)[0] for p in [
        (45, 280.25, -11),
    ]]
    fillet(fillet_16_edges, radius=FILLET_16_R)

    # Скругление17
    fillet_17_edges = [part.edges().sort_by_distance(p)[0] for p in [
        (45, 271.25, -11),
    ]]
    fillet(fillet_17_edges, radius=FILLET_17_R)

    # Скругление18
    fillet_18_edges = [part.edges().sort_by_distance(p)[0] for p in [
        (45, 264.75, -11),
    ]]
    fillet(fillet_18_edges, radius=FILLET_18_R)

    # Скругление19
    fillet_19_edges = [part.edges().sort_by_distance(p)[0] for p in [
        (45, 235.25, -11),
    ]]
    fillet(fillet_19_edges, radius=FILLET_19_R)

    # Скругление20
    fillet_20_edges = [part.edges().sort_by_distance(p)[0] for p in [
        (45, 228.75, -11),
    ]]
    fillet(fillet_20_edges, radius=FILLET_20_R)


solid = part.part
